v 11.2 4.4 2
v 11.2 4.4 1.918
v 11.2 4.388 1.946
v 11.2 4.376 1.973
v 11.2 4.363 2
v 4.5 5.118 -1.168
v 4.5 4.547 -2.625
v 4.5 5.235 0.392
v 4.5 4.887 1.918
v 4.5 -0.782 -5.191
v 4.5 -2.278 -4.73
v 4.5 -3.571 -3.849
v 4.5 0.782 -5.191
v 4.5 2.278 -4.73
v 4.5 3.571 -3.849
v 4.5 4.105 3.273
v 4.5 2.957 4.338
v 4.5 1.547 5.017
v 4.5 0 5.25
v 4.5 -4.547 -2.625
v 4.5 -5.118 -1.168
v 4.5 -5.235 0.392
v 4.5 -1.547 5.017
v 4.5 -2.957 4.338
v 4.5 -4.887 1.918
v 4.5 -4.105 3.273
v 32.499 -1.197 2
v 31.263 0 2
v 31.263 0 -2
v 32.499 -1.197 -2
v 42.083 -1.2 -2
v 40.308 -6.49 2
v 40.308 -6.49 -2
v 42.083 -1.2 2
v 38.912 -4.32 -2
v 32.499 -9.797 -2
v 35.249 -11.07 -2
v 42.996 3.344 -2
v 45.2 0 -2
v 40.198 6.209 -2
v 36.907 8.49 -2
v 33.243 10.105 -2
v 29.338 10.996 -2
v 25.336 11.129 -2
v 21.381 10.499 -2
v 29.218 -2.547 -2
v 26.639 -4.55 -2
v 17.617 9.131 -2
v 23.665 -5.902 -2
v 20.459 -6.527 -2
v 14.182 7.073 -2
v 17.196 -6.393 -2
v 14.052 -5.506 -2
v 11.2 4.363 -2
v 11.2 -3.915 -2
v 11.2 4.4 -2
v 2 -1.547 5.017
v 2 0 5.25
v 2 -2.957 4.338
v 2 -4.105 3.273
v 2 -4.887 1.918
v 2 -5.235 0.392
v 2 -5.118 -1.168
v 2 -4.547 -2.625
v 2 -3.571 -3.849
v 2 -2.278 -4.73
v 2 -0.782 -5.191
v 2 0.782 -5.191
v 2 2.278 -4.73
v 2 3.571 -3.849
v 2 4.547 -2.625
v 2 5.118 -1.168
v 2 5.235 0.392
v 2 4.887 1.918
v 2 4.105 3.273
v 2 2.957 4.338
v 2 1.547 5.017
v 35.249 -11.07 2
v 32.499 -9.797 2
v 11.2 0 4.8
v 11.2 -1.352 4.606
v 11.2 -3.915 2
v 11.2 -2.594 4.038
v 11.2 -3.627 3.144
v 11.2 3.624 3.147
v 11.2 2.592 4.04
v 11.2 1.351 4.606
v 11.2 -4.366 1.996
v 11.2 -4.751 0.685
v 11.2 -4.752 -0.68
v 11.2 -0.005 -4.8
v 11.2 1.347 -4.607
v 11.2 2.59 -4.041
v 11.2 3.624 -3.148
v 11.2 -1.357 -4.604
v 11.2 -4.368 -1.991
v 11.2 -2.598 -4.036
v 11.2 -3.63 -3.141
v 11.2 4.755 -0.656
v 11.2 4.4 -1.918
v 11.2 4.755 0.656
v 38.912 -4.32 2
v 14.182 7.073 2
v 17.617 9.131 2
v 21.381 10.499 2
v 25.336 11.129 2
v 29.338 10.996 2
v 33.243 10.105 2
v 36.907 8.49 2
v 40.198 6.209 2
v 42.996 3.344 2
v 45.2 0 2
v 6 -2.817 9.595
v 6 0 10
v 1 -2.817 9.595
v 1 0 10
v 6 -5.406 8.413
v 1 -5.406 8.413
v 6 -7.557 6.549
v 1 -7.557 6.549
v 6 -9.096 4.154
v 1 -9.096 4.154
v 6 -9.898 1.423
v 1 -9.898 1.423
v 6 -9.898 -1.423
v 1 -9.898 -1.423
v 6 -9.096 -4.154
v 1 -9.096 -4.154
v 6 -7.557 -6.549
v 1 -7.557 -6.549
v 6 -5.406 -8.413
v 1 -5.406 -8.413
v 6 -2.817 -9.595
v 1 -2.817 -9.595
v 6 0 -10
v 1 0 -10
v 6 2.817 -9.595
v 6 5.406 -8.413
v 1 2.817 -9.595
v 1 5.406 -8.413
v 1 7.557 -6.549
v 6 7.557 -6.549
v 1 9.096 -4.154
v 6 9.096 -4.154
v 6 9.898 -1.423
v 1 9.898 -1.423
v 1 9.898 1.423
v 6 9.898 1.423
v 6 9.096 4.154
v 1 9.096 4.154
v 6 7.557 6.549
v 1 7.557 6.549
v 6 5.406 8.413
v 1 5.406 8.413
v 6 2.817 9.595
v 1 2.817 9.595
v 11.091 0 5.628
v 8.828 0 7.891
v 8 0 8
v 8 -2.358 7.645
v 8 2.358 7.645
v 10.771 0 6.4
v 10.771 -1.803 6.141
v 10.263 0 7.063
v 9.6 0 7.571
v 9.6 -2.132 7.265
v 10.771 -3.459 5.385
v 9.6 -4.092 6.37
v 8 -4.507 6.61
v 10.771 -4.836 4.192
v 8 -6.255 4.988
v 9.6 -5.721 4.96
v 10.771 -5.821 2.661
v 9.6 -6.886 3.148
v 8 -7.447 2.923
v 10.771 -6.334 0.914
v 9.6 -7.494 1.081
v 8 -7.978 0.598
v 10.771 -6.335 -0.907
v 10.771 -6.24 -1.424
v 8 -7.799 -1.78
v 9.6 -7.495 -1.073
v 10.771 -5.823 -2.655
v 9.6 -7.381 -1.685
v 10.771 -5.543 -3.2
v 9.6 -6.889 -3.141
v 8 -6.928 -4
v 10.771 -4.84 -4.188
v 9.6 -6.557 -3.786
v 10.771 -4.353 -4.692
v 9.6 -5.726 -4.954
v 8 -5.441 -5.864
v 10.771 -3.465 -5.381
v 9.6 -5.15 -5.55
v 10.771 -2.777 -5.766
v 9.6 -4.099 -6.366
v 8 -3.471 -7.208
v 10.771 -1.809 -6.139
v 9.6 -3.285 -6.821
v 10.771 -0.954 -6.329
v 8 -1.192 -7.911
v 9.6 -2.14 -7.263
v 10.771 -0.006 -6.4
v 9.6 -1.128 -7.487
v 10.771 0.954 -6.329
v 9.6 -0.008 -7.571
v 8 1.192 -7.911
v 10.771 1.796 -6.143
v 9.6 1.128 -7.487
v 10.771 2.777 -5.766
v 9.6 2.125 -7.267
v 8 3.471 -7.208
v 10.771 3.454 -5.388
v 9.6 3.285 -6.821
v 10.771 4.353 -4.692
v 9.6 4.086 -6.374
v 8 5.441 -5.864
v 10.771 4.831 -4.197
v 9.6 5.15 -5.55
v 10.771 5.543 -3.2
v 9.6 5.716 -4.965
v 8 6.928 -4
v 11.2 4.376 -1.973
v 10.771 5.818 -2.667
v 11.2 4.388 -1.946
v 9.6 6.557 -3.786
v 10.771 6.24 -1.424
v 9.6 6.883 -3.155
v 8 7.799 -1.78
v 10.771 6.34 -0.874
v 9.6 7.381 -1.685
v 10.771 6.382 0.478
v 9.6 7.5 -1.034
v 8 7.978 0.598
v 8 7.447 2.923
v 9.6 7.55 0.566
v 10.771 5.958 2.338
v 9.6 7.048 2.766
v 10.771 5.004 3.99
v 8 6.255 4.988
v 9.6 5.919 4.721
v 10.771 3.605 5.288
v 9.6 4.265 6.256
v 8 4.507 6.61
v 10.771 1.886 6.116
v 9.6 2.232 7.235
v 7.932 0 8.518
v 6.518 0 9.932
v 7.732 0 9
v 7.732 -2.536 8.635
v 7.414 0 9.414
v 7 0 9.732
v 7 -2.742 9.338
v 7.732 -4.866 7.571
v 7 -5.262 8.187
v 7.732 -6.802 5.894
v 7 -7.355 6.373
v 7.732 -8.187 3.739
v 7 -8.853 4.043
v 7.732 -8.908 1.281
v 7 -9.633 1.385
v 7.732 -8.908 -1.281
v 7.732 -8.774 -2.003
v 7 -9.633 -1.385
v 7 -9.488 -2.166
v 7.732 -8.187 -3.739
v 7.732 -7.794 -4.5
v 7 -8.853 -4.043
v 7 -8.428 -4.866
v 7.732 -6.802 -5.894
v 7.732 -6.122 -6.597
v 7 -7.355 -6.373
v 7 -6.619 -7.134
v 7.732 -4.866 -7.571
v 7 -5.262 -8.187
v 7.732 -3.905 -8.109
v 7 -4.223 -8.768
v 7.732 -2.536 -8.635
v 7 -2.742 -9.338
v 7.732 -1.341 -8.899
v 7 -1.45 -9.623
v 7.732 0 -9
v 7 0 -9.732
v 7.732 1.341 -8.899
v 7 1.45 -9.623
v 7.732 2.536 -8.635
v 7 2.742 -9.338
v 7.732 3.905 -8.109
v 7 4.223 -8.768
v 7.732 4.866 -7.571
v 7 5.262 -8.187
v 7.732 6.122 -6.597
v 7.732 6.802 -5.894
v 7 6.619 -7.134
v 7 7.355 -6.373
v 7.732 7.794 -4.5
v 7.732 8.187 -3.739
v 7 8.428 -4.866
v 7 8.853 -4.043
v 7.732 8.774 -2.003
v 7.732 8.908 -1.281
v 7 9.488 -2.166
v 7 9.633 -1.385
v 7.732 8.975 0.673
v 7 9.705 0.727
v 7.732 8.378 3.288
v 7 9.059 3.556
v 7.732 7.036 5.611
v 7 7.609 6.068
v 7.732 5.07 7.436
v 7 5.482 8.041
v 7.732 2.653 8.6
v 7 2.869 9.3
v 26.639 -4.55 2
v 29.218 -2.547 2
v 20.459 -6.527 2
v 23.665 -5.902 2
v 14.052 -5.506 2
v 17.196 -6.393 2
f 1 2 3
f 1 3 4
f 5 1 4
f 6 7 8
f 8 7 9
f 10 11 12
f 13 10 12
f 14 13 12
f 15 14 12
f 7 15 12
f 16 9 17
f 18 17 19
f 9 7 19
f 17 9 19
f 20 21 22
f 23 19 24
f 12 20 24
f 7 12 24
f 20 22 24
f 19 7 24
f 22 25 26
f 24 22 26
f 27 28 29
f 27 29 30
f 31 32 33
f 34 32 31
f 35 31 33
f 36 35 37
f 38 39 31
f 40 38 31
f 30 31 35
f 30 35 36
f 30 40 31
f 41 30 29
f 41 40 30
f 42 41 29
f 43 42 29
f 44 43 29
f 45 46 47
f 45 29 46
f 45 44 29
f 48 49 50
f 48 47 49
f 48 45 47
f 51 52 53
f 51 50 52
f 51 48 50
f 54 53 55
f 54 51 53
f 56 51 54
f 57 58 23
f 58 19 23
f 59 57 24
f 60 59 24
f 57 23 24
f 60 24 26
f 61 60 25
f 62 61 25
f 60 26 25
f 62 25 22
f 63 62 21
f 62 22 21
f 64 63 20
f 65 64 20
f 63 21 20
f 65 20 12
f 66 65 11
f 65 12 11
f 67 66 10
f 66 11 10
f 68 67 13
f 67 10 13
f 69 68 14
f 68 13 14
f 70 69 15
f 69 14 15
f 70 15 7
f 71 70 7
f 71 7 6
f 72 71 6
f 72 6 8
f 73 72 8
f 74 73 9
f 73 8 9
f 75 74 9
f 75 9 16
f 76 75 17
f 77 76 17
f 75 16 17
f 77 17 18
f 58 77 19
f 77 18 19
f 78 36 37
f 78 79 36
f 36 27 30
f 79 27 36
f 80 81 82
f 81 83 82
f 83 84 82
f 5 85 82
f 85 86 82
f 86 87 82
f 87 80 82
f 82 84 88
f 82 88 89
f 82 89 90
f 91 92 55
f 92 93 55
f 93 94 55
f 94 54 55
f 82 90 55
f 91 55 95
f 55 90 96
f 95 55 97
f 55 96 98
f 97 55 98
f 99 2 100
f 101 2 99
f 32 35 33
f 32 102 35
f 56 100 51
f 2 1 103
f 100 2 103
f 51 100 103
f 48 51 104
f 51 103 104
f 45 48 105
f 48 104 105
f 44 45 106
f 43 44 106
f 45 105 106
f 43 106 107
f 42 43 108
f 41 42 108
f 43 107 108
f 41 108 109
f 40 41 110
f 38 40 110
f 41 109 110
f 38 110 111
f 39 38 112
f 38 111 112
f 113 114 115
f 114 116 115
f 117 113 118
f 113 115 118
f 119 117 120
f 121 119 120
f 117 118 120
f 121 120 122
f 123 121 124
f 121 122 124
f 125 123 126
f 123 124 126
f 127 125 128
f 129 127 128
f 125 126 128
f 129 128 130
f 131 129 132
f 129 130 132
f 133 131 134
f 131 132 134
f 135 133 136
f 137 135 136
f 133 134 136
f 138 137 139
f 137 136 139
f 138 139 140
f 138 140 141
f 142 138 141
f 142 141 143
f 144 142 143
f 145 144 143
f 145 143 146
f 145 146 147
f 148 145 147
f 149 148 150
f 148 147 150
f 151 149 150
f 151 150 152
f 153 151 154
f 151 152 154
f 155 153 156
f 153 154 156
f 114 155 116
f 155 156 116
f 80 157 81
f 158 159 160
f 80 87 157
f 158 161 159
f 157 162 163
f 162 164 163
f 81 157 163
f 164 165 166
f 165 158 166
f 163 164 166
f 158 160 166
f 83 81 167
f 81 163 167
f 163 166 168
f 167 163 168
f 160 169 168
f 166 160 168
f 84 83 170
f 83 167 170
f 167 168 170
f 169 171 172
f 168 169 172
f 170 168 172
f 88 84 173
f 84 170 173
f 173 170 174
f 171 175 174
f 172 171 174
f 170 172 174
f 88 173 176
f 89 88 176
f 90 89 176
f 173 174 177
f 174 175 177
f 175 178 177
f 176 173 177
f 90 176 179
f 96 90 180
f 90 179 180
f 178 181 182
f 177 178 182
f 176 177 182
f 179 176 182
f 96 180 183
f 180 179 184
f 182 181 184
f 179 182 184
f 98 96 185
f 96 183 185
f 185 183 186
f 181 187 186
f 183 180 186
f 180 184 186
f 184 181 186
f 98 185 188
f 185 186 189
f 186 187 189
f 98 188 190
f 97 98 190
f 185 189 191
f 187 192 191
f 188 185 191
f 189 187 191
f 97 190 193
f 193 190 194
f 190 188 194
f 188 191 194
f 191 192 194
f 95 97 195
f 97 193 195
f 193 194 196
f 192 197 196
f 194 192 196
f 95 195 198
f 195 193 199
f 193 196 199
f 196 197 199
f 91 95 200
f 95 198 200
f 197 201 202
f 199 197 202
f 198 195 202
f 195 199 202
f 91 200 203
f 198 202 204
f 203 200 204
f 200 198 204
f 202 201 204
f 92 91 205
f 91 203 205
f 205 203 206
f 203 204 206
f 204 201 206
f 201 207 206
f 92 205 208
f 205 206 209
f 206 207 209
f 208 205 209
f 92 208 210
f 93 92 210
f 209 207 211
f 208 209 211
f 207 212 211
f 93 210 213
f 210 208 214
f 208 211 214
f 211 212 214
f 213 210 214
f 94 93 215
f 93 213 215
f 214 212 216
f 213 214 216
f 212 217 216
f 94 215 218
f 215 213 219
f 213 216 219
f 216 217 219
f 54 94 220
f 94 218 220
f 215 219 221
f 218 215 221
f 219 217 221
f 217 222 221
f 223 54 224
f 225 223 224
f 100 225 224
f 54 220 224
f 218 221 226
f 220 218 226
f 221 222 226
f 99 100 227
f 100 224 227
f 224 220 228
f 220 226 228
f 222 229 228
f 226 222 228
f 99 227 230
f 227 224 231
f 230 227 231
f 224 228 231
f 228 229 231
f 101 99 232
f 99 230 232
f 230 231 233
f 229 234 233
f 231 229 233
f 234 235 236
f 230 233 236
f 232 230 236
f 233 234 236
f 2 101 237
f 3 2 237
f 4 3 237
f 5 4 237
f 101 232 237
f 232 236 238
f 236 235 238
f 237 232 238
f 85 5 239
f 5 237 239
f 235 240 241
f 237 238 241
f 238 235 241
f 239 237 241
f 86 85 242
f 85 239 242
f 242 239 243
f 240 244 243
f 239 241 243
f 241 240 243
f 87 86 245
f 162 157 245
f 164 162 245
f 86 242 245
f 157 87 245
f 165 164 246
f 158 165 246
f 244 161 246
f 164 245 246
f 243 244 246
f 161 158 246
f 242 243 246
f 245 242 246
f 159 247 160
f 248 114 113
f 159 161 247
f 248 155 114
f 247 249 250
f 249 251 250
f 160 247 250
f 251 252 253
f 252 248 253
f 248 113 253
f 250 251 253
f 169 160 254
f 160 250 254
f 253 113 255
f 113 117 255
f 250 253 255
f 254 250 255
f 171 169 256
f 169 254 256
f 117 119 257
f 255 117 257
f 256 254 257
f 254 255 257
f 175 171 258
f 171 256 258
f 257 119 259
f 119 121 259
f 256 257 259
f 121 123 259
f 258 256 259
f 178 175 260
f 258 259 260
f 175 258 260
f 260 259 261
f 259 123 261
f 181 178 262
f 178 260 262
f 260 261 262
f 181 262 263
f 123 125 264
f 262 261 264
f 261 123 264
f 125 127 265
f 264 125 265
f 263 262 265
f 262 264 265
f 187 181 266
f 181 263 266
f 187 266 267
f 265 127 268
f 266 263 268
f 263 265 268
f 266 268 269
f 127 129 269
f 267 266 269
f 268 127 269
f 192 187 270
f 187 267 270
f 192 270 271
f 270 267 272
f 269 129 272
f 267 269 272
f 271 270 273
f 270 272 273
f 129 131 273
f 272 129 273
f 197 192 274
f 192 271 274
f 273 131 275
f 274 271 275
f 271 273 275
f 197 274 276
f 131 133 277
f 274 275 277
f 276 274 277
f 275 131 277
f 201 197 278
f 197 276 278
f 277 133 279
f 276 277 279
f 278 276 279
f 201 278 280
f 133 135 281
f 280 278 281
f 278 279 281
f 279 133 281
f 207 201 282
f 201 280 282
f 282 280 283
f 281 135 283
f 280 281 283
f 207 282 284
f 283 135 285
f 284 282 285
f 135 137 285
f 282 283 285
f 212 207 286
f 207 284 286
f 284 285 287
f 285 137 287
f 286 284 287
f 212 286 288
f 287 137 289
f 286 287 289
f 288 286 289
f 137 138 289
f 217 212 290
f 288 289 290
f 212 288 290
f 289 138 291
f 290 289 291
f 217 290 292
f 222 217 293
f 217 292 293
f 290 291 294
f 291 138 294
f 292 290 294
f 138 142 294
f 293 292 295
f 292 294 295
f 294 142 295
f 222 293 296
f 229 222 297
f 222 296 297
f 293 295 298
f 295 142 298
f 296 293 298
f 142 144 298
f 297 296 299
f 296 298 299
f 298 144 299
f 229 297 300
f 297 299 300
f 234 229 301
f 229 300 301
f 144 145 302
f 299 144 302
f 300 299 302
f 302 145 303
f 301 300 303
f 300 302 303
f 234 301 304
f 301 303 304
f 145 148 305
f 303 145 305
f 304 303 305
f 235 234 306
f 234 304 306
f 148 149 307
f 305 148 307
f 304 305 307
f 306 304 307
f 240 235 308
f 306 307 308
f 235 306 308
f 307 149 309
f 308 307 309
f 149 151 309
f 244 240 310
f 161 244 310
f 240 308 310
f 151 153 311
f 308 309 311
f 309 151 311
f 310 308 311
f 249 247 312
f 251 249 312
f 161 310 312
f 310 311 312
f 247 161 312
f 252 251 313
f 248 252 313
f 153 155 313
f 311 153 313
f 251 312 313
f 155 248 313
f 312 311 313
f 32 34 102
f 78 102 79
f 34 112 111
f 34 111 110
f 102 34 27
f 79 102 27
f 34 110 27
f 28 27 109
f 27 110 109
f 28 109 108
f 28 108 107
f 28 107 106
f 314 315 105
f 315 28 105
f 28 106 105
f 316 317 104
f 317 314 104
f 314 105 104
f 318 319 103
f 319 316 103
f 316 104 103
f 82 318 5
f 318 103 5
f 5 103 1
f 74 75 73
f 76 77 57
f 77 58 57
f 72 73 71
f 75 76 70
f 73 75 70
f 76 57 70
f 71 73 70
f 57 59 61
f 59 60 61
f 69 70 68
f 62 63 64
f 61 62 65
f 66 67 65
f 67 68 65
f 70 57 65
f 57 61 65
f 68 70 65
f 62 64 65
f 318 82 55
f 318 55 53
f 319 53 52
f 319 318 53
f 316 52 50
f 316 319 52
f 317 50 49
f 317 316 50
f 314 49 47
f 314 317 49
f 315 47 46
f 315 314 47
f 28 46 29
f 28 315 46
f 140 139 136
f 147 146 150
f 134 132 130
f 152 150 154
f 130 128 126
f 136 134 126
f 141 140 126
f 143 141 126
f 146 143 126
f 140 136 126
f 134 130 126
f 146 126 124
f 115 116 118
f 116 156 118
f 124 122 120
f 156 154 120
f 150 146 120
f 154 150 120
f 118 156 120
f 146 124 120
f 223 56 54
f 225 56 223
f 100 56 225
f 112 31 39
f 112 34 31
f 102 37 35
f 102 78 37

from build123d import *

# Parameters (mm, degrees)
EXTRUDE_2338_DEPTH = 2


with BuildPart() as part:
    # Sketch 227 → Повернуть1 (revolve)
    with BuildSketch(Plane.XY, mode=Mode.PRIVATE) as revolve_1_sk:
        with BuildLine():
            Line((6, 10), (1, 10))
            Line((1, 10), (1, 0))
            Line((1, 0), (2, 0))
            Line((2, 0), (2, 5.25))
            Line((2, 5.25), (4.5, 5.25))
            Line((4.5, 5.25), (4.5, 0))
            Line((4.5, 0), (11.2, 0))
            Line((11.2, 0), (11.2, 4.8))
            ThreePointArc((11.2, 4.8), (10.2627417, 7.0627417), (8, 8))
            ThreePointArc((8, 8), (7.414213562, 9.414213562), (6, 10))
        make_face()
    revolve(revolve_1_sk.sketch.rotate(Axis((0, 0, 0), (1, 0, 0)), 90), axis=Axis((0, 0, 0), (1, 0, 0)))

    # Sketch 1321 → Extrude 2338 (add, symmetric)
    with BuildSketch(Plane.XY):
        with BuildLine():
            ThreePointArc((11.2, 4.4), (29.338267199, 10.995701086), (45.2, 0))
            Line((45.2, 0), (11.2, 0))
            Line((11.2, 0), (11.2, 4.4))
        make_face()
        with BuildLine():
            Line((31.263463773, 0), (11.2, 0))
            Line((11.2, 0), (11.2, -3.914978255))
            ThreePointArc((11.2, -3.914978255), (22.080678837, -6.30816882), (31.263463773, 0))
        make_face()
        Polygon((38.912013935, 0), (35.248695767, 0), (35.248695767, -11.07), (38.912013935, -4.32), align=None)
        Polygon((35.248695767, 0), (31.263463773, 0), (32.498964702, -1.197255299), (32.498964702, -9.797255299), (35.248695767, -11.07), align=None)
        Polygon((42.083014277, -1.2), (42.083014277, 0), (40.307542508, 0), (40.307542508, -6.49), align=None)
        Polygon((40.307542508, 0), (38.912013935, 0), (38.912013935, -4.32), (40.307542508, -6.49), align=None)
        Polygon((42.083014277, -1.2), (45.2, 0), (42.083014277, 0), align=None)
    extrude(amount=EXTRUDE_2338_DEPTH, both=True)


solid = part.part
